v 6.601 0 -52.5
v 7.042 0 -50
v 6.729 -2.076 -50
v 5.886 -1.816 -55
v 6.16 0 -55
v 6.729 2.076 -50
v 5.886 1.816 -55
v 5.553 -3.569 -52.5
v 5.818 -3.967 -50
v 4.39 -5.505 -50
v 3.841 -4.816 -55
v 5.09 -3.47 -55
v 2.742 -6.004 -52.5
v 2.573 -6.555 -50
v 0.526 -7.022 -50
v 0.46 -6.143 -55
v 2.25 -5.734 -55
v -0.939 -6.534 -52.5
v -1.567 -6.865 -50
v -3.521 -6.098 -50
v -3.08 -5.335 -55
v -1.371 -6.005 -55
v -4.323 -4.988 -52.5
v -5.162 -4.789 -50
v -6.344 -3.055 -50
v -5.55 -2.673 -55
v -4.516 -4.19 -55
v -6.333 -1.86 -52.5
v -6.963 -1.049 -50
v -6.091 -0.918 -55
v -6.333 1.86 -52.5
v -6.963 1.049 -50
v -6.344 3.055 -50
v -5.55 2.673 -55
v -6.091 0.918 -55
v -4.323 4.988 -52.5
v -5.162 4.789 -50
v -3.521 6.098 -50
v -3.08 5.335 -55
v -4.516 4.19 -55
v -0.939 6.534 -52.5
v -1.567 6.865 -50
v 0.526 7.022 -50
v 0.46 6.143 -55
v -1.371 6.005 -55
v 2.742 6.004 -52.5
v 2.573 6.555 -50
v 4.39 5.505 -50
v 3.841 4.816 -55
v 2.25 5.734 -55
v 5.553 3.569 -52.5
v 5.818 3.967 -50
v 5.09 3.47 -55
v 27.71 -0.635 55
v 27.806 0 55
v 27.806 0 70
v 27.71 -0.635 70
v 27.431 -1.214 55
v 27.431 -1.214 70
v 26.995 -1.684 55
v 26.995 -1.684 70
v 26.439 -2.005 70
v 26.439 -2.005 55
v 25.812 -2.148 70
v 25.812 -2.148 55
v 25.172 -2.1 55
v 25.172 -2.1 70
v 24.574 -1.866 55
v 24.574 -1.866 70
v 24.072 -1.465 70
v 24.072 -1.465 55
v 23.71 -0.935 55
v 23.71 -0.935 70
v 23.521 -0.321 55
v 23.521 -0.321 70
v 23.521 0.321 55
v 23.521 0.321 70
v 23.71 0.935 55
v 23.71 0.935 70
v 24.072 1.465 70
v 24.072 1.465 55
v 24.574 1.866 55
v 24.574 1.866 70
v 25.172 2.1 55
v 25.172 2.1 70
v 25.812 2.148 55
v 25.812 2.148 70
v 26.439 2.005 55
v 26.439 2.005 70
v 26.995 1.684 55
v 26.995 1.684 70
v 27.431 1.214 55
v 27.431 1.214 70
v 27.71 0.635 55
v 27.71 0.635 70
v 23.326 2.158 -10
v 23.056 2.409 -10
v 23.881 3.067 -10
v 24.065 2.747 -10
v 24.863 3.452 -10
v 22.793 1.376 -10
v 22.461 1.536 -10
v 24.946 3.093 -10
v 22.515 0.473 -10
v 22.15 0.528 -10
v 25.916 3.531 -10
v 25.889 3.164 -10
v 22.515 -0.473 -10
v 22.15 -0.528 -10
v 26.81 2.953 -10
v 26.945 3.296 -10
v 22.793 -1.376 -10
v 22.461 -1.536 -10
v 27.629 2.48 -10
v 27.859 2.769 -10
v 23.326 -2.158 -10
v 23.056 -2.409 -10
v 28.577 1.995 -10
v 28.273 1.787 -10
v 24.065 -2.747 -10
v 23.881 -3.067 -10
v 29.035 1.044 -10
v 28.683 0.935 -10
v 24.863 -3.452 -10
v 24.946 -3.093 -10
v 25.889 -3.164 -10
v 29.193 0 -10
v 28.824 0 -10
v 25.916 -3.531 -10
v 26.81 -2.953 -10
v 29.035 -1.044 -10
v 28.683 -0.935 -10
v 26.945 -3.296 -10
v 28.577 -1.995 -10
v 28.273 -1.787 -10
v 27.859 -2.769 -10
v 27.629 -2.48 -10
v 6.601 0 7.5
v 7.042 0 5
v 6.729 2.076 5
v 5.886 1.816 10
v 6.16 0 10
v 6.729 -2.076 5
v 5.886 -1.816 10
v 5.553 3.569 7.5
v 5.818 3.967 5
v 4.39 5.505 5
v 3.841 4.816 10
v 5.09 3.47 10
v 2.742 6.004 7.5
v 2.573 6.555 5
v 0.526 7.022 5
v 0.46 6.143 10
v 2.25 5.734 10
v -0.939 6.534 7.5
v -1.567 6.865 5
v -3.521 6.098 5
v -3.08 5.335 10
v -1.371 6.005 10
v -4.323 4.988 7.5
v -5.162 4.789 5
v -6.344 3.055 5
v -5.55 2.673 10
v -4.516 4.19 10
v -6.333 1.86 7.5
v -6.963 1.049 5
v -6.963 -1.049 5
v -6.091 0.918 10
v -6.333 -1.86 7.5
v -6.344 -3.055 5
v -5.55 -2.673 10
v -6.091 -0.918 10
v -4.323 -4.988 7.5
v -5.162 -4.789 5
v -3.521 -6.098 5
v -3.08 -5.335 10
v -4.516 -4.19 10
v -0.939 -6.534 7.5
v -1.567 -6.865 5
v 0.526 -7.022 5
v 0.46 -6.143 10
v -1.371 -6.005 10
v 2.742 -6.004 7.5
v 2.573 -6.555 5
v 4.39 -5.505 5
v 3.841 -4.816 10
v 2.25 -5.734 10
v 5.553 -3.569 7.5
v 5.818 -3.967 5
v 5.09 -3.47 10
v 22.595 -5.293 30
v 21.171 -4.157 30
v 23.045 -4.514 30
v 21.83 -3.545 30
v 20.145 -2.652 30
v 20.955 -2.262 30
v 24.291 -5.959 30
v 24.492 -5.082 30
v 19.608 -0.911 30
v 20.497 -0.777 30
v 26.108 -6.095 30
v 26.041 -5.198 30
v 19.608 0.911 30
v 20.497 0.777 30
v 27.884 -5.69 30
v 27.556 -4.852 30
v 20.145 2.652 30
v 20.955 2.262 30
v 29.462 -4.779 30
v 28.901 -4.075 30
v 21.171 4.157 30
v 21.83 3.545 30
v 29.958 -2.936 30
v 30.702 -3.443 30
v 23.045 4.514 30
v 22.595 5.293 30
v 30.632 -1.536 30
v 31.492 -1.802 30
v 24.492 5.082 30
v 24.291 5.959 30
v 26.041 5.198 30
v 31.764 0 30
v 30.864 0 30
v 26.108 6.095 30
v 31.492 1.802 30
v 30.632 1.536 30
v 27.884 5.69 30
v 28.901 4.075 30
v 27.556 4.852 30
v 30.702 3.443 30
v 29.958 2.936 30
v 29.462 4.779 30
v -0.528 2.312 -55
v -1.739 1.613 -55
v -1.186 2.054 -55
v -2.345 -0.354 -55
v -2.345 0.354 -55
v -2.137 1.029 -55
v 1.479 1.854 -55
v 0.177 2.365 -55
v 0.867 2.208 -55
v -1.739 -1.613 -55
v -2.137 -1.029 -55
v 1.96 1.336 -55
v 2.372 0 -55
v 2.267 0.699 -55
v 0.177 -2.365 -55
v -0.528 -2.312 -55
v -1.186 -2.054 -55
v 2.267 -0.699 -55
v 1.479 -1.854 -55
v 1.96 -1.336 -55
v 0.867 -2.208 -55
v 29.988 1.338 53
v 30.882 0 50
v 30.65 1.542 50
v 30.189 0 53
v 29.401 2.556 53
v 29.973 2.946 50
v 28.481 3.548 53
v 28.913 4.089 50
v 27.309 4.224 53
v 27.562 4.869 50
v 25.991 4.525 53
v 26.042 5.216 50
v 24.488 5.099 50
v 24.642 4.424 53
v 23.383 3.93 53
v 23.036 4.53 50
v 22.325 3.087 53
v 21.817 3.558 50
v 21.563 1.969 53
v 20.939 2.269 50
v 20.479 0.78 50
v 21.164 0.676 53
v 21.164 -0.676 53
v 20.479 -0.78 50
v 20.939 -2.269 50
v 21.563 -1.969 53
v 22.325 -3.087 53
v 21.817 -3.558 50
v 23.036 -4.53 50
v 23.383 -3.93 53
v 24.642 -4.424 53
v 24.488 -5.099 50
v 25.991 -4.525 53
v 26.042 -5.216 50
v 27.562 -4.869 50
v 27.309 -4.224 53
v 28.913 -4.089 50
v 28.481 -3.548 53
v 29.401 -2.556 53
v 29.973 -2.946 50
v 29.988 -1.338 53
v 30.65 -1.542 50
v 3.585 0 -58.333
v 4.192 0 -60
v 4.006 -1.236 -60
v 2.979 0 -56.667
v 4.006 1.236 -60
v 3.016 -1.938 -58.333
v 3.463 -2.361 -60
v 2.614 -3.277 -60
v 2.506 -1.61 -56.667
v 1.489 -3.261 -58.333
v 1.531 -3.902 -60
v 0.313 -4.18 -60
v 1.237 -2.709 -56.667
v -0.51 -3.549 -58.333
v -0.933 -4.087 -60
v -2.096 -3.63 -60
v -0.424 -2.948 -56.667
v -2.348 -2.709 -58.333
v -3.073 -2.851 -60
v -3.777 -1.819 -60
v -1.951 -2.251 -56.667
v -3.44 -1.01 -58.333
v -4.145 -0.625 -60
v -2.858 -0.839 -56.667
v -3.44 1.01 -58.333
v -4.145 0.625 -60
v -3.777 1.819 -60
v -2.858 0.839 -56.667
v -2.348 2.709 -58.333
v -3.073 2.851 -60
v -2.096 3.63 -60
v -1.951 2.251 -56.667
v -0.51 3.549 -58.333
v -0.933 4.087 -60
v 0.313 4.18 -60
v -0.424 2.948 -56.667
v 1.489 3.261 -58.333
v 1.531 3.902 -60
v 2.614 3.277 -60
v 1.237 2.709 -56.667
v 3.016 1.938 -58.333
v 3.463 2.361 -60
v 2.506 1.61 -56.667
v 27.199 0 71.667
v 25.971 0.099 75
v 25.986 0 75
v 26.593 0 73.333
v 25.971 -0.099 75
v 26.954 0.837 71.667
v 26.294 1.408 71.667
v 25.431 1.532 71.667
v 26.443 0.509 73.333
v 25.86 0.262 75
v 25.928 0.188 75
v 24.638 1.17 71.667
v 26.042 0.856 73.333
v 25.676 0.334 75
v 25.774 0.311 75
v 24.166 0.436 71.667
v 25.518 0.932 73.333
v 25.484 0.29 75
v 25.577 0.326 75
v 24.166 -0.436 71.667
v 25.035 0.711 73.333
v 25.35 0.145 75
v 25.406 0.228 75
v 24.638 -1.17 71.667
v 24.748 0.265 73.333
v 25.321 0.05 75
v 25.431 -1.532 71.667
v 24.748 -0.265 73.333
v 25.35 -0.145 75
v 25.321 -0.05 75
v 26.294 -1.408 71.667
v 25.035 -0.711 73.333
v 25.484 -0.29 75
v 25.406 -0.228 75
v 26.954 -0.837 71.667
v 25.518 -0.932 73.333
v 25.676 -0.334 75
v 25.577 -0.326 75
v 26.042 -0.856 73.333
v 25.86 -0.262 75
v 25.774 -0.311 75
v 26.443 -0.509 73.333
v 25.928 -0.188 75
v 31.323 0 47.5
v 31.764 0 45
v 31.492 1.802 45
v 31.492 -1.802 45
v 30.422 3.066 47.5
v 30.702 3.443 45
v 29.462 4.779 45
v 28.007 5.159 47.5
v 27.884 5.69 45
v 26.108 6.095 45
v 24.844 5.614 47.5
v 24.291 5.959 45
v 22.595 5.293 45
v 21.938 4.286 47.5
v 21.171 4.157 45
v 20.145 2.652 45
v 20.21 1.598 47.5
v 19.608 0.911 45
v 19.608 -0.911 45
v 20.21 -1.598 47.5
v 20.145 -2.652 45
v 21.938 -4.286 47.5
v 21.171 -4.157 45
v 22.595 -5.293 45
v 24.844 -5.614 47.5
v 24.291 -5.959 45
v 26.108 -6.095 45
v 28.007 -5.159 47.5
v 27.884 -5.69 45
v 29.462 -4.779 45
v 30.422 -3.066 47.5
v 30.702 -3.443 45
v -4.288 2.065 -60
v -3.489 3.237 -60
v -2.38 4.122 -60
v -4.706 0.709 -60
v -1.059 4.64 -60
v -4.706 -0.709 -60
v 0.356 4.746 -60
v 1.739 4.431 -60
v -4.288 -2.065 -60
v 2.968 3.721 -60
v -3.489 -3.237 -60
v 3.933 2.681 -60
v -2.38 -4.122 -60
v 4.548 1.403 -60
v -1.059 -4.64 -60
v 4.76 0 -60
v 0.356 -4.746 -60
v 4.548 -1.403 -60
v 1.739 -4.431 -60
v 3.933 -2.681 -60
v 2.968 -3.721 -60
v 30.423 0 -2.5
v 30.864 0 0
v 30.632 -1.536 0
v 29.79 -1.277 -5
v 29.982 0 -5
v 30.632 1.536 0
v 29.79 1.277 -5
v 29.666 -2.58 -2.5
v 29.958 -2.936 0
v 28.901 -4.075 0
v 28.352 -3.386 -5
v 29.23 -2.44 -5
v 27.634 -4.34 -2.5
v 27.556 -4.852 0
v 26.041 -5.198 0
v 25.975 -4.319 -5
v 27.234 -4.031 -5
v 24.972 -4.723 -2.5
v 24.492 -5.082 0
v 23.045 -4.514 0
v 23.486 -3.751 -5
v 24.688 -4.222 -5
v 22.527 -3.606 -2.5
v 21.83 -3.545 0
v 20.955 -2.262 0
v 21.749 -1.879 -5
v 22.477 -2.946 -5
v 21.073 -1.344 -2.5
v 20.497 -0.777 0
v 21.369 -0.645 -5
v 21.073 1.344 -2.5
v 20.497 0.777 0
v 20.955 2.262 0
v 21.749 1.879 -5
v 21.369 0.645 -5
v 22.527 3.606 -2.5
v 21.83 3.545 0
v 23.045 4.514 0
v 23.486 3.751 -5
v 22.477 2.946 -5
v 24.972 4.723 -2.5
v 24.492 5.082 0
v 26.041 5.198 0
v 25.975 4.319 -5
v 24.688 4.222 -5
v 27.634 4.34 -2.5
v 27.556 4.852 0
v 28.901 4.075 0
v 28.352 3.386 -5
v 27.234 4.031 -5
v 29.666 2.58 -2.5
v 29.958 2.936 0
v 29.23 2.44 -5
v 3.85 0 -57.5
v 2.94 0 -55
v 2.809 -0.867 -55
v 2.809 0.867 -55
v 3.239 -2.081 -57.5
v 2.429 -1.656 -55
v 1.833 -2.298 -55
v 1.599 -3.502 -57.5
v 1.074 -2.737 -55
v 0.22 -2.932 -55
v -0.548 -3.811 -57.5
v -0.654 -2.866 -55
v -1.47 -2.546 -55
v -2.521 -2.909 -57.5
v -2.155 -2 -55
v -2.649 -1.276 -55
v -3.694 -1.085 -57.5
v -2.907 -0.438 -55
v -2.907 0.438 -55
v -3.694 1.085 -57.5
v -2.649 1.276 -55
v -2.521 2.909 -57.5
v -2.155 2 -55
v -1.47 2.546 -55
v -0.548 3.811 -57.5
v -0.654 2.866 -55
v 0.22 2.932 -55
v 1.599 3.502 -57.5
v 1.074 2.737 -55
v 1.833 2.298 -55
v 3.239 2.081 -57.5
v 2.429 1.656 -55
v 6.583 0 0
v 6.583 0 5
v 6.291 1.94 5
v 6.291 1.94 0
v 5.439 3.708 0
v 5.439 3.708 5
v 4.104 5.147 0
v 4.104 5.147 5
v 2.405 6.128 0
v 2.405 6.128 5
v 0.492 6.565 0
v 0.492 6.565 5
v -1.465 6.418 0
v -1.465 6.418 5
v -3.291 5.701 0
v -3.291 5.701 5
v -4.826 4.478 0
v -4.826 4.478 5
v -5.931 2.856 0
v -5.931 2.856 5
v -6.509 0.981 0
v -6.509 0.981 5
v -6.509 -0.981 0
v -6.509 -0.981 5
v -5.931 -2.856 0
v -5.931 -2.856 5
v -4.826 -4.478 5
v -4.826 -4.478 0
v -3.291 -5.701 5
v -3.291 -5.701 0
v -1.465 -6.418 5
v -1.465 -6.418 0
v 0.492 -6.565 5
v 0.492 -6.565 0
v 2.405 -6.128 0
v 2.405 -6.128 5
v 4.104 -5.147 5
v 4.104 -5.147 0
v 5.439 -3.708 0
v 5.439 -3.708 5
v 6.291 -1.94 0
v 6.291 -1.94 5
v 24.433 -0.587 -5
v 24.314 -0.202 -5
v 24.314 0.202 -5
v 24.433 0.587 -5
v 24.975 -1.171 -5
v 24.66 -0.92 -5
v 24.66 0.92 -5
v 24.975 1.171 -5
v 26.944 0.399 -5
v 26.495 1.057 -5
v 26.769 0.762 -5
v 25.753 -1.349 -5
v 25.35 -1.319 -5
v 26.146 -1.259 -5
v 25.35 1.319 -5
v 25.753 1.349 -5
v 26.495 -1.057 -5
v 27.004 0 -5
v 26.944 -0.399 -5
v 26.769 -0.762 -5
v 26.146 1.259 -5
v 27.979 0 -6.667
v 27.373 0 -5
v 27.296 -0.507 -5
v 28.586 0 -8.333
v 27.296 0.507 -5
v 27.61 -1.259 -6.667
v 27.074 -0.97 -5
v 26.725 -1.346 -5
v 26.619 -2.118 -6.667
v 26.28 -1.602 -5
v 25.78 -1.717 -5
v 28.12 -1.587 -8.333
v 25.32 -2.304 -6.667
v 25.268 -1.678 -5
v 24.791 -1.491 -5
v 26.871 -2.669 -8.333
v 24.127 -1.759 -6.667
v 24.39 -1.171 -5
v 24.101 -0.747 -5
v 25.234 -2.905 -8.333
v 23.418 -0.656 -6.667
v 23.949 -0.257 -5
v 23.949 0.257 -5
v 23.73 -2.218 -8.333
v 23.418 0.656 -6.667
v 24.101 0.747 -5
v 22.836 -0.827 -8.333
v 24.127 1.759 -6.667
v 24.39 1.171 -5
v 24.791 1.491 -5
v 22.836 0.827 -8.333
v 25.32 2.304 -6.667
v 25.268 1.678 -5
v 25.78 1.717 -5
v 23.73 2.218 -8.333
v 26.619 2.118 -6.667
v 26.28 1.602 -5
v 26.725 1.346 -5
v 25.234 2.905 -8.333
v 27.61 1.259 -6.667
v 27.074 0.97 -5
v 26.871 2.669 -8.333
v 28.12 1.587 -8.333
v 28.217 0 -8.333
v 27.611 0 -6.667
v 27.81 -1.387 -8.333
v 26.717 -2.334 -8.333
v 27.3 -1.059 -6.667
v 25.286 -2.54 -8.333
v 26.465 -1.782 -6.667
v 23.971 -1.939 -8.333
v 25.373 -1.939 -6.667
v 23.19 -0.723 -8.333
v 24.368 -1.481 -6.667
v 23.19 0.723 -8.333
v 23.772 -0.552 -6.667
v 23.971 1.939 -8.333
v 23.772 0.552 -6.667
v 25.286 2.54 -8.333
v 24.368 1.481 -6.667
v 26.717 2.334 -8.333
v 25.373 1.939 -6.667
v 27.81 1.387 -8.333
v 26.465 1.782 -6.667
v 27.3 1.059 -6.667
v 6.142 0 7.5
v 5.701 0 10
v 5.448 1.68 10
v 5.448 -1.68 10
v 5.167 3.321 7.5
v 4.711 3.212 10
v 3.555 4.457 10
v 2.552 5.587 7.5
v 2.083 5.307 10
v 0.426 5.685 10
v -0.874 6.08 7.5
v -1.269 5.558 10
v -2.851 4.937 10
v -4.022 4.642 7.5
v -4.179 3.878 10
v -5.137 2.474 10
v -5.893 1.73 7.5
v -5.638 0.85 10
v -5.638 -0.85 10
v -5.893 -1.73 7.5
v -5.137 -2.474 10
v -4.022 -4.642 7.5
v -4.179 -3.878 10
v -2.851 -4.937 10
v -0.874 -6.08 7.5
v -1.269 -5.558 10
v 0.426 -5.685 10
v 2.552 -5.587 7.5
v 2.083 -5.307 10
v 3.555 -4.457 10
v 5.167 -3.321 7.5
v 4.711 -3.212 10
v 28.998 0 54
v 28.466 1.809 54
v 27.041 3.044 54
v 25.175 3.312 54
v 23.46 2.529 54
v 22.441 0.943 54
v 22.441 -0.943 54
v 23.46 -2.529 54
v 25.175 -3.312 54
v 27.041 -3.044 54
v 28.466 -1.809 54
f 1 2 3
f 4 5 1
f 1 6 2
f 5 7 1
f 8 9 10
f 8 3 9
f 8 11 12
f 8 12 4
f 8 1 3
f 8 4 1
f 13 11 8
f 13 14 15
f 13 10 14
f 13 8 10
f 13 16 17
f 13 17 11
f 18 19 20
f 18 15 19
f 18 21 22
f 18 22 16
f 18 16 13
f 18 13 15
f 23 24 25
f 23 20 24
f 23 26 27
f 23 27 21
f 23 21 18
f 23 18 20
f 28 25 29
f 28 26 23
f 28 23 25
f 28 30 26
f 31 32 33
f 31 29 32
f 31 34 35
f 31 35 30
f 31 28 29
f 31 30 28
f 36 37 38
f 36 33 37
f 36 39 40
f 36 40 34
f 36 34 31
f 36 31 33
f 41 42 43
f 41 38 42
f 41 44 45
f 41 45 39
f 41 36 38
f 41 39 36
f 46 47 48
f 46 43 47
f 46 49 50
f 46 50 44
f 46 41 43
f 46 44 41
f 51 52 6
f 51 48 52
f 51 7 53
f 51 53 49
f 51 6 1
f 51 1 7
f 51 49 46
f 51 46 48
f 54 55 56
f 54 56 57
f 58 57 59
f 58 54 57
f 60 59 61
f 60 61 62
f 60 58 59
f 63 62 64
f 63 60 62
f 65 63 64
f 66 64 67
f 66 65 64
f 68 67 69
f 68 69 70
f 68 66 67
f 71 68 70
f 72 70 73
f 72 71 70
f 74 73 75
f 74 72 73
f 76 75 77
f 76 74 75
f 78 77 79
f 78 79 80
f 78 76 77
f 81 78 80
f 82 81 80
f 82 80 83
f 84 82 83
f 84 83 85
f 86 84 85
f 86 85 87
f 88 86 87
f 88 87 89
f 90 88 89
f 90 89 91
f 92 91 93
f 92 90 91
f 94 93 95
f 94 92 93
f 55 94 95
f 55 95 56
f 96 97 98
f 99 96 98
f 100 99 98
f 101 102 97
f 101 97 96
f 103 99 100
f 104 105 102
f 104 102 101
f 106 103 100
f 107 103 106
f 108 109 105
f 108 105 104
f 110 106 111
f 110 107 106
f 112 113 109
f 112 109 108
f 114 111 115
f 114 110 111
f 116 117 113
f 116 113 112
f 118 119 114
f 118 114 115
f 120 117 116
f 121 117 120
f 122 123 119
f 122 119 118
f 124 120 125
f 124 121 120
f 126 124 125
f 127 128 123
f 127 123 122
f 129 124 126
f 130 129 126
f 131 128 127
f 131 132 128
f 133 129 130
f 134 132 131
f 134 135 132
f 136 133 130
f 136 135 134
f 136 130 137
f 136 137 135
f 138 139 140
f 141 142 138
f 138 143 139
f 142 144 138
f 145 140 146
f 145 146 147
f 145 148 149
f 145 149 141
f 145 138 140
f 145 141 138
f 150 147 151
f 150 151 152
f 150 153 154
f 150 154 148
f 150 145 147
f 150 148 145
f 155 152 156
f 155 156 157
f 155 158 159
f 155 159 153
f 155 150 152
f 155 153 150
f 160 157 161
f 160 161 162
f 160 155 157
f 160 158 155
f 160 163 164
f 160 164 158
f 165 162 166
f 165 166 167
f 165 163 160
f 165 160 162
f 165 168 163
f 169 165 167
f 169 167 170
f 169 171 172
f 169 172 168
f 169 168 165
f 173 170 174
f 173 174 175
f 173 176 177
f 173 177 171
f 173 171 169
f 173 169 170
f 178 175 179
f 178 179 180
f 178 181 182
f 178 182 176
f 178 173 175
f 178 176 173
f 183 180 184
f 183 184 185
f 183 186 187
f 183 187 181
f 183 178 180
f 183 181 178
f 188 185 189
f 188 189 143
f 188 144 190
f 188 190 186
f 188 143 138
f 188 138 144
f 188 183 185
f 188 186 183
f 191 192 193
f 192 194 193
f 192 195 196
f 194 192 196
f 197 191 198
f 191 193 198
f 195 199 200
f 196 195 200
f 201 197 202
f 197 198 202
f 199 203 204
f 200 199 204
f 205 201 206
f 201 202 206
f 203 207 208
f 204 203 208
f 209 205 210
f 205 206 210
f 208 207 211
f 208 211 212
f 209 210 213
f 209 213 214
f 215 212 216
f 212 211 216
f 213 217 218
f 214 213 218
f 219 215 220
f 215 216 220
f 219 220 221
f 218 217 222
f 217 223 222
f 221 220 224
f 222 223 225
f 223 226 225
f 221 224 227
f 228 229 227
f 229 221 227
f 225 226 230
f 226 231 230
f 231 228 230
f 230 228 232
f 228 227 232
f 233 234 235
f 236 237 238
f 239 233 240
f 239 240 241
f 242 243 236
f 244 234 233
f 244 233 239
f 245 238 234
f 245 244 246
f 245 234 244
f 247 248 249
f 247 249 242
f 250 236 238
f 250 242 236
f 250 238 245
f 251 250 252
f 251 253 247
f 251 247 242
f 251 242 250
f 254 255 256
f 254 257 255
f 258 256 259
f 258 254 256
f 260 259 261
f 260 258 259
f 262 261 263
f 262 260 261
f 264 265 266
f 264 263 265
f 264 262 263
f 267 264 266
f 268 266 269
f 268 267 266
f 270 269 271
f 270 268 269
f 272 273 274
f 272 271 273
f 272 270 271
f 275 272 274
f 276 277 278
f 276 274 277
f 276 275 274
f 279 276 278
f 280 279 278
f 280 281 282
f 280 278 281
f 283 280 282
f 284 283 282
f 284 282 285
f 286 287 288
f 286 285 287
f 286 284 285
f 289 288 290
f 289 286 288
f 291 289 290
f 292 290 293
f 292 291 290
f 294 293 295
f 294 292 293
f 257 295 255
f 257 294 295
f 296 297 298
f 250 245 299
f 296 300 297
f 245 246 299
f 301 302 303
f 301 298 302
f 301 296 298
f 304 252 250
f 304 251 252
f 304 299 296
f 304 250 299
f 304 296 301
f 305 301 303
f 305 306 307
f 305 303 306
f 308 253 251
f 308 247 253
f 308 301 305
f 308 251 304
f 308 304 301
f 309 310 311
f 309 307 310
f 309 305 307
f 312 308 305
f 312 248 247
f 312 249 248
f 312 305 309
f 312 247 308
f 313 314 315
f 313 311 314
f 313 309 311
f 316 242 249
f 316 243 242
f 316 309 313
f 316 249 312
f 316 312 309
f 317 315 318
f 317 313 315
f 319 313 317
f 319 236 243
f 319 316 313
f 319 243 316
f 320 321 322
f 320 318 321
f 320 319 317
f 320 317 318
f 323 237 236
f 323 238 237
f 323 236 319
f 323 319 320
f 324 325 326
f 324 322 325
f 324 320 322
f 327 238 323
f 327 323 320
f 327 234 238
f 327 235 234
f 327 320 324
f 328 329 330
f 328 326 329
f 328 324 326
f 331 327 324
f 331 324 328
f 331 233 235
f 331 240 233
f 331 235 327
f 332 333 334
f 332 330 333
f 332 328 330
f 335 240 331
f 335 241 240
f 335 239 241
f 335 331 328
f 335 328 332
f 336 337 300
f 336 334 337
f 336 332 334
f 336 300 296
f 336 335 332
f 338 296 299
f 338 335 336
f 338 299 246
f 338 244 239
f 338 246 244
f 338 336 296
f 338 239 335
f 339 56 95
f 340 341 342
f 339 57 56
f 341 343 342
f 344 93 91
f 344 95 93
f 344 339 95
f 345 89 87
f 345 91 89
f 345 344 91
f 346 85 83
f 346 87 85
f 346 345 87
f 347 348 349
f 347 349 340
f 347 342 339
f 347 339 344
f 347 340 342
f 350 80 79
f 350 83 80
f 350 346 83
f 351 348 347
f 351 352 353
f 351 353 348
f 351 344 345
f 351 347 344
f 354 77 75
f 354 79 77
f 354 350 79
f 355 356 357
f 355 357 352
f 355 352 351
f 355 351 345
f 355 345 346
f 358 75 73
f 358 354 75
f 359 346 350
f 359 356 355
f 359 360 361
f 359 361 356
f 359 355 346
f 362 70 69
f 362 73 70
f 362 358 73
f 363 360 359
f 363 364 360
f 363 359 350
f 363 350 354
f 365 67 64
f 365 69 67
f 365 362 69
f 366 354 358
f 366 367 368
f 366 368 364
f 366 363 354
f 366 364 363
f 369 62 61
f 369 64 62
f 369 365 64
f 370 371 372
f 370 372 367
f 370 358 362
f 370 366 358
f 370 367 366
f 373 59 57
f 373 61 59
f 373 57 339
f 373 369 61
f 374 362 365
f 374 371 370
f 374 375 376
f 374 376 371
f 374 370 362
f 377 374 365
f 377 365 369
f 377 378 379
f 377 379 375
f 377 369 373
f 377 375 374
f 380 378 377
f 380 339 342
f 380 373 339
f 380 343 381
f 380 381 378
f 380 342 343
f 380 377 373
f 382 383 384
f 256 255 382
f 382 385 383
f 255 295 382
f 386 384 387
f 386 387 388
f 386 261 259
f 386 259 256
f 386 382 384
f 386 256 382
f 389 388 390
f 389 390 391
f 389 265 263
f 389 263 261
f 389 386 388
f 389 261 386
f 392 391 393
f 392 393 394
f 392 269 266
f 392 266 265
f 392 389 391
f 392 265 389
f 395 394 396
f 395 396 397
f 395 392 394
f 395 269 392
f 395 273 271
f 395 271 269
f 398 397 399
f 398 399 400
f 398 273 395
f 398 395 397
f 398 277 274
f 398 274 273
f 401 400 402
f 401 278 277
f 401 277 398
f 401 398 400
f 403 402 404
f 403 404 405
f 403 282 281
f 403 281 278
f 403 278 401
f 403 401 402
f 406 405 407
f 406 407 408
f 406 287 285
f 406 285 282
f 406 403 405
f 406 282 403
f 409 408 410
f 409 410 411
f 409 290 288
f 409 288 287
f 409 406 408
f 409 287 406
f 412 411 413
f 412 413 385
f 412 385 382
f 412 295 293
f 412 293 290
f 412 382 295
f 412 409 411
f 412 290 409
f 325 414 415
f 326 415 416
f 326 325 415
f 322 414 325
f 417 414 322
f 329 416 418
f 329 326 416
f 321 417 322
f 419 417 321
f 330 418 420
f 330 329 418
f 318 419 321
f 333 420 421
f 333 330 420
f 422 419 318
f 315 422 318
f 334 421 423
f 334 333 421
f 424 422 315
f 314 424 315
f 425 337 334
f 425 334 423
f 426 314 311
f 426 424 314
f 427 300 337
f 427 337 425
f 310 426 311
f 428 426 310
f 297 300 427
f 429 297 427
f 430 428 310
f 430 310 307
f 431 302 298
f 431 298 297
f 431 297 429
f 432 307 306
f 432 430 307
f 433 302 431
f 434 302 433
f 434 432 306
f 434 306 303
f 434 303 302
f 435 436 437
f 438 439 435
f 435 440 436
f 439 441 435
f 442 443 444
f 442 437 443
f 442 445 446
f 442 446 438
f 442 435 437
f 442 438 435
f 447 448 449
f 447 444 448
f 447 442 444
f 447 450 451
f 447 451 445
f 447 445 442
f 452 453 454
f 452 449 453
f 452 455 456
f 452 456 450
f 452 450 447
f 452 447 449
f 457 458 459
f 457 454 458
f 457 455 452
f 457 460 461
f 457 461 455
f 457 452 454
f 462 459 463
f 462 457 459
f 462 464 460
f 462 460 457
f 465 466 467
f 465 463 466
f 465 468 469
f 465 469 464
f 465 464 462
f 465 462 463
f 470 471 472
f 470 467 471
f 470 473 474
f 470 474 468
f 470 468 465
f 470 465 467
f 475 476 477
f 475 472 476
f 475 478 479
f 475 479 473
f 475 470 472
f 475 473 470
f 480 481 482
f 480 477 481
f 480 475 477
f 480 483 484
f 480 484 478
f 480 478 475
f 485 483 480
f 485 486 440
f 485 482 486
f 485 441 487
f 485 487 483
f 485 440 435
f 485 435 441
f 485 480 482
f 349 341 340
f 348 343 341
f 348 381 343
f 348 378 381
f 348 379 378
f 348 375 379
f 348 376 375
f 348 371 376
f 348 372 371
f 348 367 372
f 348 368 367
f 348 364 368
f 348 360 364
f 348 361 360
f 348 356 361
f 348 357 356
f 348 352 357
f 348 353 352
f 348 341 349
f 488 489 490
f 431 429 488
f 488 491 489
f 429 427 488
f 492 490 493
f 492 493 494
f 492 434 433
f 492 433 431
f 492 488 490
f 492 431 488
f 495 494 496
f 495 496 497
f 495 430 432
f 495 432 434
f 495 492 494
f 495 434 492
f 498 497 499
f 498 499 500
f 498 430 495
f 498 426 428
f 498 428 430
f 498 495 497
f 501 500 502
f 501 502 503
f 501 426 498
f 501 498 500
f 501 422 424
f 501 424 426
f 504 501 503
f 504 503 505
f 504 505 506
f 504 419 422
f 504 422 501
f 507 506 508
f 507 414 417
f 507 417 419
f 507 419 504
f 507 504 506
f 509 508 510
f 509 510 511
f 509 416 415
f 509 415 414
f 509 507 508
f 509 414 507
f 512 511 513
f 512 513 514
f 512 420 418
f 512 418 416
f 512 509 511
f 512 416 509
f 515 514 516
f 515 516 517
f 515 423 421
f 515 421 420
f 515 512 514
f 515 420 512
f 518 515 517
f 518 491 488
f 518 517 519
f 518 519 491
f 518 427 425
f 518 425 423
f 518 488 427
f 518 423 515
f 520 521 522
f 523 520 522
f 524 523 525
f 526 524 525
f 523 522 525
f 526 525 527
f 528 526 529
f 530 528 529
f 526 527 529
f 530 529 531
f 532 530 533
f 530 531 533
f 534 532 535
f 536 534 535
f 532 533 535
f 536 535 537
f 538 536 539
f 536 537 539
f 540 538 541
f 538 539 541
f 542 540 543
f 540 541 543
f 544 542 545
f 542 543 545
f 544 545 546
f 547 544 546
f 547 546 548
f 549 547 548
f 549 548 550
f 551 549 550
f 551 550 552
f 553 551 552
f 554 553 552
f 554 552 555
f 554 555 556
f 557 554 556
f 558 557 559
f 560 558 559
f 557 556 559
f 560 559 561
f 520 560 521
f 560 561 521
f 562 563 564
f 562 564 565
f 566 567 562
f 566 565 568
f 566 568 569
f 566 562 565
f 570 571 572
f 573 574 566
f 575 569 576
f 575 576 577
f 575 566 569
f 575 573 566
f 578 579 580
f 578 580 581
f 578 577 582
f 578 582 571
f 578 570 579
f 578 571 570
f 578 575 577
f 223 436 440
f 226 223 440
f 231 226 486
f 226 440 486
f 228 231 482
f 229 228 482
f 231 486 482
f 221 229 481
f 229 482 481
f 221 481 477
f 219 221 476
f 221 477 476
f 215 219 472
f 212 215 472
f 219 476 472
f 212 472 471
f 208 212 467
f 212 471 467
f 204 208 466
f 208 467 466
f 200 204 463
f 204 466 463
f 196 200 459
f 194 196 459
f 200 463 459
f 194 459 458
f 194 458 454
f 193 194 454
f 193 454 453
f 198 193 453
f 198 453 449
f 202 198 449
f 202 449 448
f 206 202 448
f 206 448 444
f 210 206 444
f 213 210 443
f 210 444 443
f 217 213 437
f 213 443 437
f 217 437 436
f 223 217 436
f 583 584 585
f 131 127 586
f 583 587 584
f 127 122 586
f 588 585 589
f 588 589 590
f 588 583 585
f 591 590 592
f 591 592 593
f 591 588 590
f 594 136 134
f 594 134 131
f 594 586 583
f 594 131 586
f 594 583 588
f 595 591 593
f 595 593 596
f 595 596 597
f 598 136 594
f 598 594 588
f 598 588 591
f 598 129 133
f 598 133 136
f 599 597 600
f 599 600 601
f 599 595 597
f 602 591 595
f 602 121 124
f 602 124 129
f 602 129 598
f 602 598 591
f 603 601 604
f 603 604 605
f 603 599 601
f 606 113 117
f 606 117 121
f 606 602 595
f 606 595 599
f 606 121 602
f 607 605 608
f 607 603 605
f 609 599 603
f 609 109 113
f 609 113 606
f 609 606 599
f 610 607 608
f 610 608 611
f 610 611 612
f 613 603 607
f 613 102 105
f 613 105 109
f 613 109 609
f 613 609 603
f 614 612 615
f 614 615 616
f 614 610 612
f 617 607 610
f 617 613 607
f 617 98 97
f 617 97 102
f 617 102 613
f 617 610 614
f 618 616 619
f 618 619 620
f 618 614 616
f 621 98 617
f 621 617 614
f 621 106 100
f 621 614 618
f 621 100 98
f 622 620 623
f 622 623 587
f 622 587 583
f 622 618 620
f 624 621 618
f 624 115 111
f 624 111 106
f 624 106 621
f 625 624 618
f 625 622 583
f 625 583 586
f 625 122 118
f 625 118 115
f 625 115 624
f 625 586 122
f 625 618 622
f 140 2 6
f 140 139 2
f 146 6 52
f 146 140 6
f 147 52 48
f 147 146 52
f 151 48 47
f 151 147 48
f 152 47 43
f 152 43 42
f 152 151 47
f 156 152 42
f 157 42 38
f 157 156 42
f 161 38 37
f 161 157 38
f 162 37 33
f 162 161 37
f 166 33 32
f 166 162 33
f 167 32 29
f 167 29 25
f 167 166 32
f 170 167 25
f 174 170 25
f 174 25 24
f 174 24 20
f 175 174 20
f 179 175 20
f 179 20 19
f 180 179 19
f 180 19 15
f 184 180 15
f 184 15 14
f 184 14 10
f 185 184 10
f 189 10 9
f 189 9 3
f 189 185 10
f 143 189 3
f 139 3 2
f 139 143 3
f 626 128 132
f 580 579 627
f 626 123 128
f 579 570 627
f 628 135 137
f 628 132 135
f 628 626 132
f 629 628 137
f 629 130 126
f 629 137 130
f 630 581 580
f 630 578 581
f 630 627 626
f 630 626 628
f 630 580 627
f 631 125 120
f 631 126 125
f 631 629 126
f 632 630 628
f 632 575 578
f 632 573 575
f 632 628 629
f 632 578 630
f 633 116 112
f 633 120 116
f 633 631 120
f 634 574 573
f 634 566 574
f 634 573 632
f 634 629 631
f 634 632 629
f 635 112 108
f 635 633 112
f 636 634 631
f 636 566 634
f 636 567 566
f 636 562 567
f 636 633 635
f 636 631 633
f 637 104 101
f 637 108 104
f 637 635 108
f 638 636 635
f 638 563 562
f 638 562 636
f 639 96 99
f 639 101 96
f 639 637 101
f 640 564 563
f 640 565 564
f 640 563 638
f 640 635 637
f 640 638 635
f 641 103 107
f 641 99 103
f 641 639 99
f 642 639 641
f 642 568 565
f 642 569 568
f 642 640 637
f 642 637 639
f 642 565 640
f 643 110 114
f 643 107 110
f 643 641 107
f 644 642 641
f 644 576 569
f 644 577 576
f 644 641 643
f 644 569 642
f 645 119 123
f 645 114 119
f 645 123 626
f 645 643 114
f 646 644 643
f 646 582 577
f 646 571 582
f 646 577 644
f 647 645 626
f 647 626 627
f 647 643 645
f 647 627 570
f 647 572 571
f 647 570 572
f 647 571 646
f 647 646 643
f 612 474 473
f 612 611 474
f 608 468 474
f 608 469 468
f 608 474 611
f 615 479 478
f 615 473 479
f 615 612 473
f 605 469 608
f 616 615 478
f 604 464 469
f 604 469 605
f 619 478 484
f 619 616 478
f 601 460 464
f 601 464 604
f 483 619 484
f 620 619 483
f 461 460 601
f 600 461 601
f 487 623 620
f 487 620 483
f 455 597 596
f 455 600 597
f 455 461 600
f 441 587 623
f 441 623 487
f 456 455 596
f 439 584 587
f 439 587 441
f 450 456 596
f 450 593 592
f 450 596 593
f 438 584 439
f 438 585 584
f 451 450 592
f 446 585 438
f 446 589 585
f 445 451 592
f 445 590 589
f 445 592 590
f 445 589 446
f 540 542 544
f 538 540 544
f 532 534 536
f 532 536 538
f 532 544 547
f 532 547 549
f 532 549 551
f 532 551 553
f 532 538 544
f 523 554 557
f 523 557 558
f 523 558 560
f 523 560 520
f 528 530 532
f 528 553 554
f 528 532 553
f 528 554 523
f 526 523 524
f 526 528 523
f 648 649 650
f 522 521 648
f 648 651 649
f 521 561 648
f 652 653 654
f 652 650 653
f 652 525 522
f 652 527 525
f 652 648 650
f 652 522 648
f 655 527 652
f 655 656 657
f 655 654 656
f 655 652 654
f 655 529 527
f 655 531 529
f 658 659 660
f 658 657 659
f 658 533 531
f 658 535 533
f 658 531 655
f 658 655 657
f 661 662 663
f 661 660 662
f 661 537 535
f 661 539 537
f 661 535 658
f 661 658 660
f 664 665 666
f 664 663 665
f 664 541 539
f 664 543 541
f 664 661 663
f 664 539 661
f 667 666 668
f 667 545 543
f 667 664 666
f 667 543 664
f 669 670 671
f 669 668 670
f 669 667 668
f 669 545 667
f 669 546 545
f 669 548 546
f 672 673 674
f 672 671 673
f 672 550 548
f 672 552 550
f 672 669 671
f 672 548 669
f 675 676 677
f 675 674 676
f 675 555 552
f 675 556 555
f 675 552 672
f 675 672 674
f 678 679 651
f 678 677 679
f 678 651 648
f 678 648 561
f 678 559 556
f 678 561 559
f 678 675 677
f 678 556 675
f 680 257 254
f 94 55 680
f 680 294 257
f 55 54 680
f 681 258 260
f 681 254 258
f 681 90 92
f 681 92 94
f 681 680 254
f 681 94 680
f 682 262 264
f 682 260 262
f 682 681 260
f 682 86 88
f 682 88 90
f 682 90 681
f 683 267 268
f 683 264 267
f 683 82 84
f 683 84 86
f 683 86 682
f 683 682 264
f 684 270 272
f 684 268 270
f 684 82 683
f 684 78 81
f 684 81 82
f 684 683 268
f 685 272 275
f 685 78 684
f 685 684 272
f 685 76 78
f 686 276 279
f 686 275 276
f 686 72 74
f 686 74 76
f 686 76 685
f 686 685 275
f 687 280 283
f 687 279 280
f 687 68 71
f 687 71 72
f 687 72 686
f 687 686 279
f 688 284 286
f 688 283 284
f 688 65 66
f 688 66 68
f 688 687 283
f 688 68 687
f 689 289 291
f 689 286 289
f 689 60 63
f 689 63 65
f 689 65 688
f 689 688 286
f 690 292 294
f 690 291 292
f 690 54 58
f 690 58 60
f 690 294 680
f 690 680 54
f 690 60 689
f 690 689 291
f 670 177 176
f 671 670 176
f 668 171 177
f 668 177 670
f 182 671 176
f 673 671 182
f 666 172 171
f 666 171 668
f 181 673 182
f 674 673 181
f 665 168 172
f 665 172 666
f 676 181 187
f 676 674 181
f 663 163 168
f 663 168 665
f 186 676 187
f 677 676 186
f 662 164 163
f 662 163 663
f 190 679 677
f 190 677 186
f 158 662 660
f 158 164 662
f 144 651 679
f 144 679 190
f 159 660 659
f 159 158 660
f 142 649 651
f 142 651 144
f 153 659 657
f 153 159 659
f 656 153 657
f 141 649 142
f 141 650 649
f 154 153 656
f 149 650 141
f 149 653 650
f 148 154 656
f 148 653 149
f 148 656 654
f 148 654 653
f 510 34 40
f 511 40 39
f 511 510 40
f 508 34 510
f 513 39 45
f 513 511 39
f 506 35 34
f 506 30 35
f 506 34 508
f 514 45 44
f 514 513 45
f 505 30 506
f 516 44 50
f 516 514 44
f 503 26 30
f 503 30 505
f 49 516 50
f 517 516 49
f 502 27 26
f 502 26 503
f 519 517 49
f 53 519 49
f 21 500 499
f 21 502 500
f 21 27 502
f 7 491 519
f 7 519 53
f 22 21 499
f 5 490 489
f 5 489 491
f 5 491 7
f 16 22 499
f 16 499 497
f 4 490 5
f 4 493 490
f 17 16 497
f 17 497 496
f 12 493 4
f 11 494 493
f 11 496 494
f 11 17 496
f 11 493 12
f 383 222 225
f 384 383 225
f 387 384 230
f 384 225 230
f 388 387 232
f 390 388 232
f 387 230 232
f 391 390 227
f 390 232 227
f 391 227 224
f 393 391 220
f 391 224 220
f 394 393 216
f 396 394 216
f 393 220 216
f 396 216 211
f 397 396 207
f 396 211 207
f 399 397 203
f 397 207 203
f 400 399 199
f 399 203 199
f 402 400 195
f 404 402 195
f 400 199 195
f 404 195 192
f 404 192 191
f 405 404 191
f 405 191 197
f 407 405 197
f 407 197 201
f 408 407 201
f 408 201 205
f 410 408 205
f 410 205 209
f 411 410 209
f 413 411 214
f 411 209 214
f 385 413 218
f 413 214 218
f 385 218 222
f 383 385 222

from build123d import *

# Parameters (mm, degrees)
F0_R          = 7.0415338491
F1_DEPTH      = 5
F1_DEPTH_BACK = 50
F1_FACE_R     = 7.0415338491
F2_DEPTH      = 5
F2_TAPER      = 10
F1_FACE1_R    = 7.0415338491
F3_DEPTH      = 5
F3_TAPER      = 10
F4_R          = 5.7013293064
F5_DEPTH      = 5
F5_TAPER      = -10
F6_R          = 2.93979731
F7_DEPTH      = 5
F7_TAPER      = -20
F8_R          = 4.1917366142
F9_DEPTH      = 5
F9_TAPER      = 20
F10_R         = 5.2124971129
F11_DEPTH     = 30
F11_FACE_R    = 5.2124971129
F12_DEPTH     = 5
F12_TAPER     = 10
F13_R         = 1.7213370452
F14_DEPTH     = 5
F14_TAPER     = -20
F15_R         = 3.1723936167
F16_DEPTH     = 5
F16_TAPER     = 20
F17_DEPTH     = 5
F18_R         = 6.1121250455
F19_DEPTH     = 15
F19_FACE_R    = 6.1121250455
F20_DEPTH     = 5
F20_TAPER     = 10
F20_FACE_R    = 5.230490142
F21_DEPTH     = 3
F21_TAPER     = 13
F21_FACE_R    = 4.5378855686
F22_DEPTH     = 2
F22_TAPER     = 50
F23_DEPTH     = 15
F23_FACE_R    = 2.1543783834
F24_DEPTH     = 5
F24_TAPER     = 20


with BuildPart() as f1:
    # F0 (on Top) → F1 (new body, two sides)
    with BuildSketch(Plane.XY) as f1_sk:
        Circle(F0_R)
    extrude(amount=F1_DEPTH)
    extrude(f1_sk.sketch, amount=-F1_DEPTH_BACK)

    # F1_face (on face) → F2 (join)
    with BuildSketch(Plane(origin=(0, 0, -50), x_dir=(1, 0, 0), z_dir=(0, 0, -1))):
        Circle(F1_FACE_R)
    extrude(amount=F2_DEPTH, taper=F2_TAPER)

    # F1_face1 (on face) → F3 (join)
    with BuildSketch(Plane.XY.offset(5)):
        Circle(F1_FACE1_R)
    extrude(amount=F3_DEPTH, taper=F3_TAPER)

    # F4 (on face) → F5 (cut)
    with BuildSketch(Plane.XY.offset(10)):
        Circle(F4_R)
    extrude(amount=-F5_DEPTH, taper=F5_TAPER, mode=Mode.SUBTRACT)

    # F6 (on face) → F7 (join)
    with BuildSketch(Plane(origin=(0, 0, -55), x_dir=(1, 0, 0), z_dir=(0, 0, -1))):
        Circle(F6_R)
    extrude(amount=F7_DEPTH, taper=F7_TAPER)

    # F8 (on face) → F9 (cut)
    with BuildSketch(Plane(origin=(0, 0, -60), x_dir=(1, 0, 0), z_dir=(0, 0, -1))):
        Circle(F8_R)
    extrude(amount=-F9_DEPTH, taper=F9_TAPER, mode=Mode.SUBTRACT)

    # F17 (cut): a face of the model
    f17_faces = [f1.faces().sort_by_distance(p)[0] for p in [
        (0, 0, 5),
    ]]
    extrude(f17_faces, amount=-F17_DEPTH, mode=Mode.SUBTRACT)


with BuildPart() as f11:
    # F10 (on Top) → F11 (new body)
    with BuildSketch(Plane.XY):
        with Locations((25.6514661014, 0)):
            Circle(F10_R)
    extrude(amount=F11_DEPTH)

    # F11_face (on face) → F12 (join)
    with BuildSketch(Plane(origin=(25.6514661014, 0, 0), x_dir=(1, 0, 0), z_dir=(0, 0, -1))):
        Circle(F11_FACE_R)
    extrude(amount=F12_DEPTH, taper=F12_TAPER)

    # F13 (on face) → F14 (join)
    with BuildSketch(Plane(origin=(0, 0, -5), x_dir=(1, 0, 0), z_dir=(0, 0, -1))):
        with Locations((25.6514661014, 0)):
            Circle(F13_R)
    extrude(amount=F14_DEPTH, taper=F14_TAPER)

    # F15 (on face) → F16 (cut)
    with BuildSketch(Plane(origin=(0, 0, -10), x_dir=(1, 0, 0), z_dir=(0, 0, -1))):
        with Locations((25.6514661014, 0)):
            Circle(F15_R)
    extrude(amount=-F16_DEPTH, taper=F16_TAPER, mode=Mode.SUBTRACT)

    # F18 (on face) → F19 (join)
    with BuildSketch(Plane.XY.offset(30)):
        with Locations((25.6514661014, 0)):
            Circle(F18_R)
    extrude(amount=F19_DEPTH)

    # F19_face (on face) → F20 (join)
    with BuildSketch(Plane(origin=(25.6514661014, 0, 45), x_dir=(1, 0, 0), z_dir=(0, 0, 1))):
        Circle(F19_FACE_R)
    extrude(amount=F20_DEPTH, taper=F20_TAPER)

    # F20_face (on face) → F21 (join)
    with BuildSketch(Plane(origin=(25.6514661014, 0, 50), x_dir=(1, 0, 0), z_dir=(0, 0, 1))):
        Circle(F20_FACE_R)
    extrude(amount=F21_DEPTH, taper=F21_TAPER)

    # F21_face (on face) → F22 (join)
    with BuildSketch(Plane(origin=(25.6514661014, 0, 53), x_dir=(1, 0, 0), z_dir=(0, 0, 1))):
        Circle(F21_FACE_R)
    extrude(amount=F22_DEPTH, taper=F22_TAPER)

    # F23 (add): a face of the model
    f23_faces = [f11.faces().sort_by_distance(p)[0] for p in [
        (25.6514661014, 0, 55),
    ]]
    extrude(f23_faces, amount=F23_DEPTH)

    # F23_face (on face) → F24 (join)
    with BuildSketch(Plane(origin=(25.6514661014, 0, 70), x_dir=(1, 0, 0), z_dir=(0, 0, 1))):
        Circle(F23_FACE_R)
    extrude(amount=F24_DEPTH, taper=F24_TAPER)


solid = Compound([f1.part, f11.part])
